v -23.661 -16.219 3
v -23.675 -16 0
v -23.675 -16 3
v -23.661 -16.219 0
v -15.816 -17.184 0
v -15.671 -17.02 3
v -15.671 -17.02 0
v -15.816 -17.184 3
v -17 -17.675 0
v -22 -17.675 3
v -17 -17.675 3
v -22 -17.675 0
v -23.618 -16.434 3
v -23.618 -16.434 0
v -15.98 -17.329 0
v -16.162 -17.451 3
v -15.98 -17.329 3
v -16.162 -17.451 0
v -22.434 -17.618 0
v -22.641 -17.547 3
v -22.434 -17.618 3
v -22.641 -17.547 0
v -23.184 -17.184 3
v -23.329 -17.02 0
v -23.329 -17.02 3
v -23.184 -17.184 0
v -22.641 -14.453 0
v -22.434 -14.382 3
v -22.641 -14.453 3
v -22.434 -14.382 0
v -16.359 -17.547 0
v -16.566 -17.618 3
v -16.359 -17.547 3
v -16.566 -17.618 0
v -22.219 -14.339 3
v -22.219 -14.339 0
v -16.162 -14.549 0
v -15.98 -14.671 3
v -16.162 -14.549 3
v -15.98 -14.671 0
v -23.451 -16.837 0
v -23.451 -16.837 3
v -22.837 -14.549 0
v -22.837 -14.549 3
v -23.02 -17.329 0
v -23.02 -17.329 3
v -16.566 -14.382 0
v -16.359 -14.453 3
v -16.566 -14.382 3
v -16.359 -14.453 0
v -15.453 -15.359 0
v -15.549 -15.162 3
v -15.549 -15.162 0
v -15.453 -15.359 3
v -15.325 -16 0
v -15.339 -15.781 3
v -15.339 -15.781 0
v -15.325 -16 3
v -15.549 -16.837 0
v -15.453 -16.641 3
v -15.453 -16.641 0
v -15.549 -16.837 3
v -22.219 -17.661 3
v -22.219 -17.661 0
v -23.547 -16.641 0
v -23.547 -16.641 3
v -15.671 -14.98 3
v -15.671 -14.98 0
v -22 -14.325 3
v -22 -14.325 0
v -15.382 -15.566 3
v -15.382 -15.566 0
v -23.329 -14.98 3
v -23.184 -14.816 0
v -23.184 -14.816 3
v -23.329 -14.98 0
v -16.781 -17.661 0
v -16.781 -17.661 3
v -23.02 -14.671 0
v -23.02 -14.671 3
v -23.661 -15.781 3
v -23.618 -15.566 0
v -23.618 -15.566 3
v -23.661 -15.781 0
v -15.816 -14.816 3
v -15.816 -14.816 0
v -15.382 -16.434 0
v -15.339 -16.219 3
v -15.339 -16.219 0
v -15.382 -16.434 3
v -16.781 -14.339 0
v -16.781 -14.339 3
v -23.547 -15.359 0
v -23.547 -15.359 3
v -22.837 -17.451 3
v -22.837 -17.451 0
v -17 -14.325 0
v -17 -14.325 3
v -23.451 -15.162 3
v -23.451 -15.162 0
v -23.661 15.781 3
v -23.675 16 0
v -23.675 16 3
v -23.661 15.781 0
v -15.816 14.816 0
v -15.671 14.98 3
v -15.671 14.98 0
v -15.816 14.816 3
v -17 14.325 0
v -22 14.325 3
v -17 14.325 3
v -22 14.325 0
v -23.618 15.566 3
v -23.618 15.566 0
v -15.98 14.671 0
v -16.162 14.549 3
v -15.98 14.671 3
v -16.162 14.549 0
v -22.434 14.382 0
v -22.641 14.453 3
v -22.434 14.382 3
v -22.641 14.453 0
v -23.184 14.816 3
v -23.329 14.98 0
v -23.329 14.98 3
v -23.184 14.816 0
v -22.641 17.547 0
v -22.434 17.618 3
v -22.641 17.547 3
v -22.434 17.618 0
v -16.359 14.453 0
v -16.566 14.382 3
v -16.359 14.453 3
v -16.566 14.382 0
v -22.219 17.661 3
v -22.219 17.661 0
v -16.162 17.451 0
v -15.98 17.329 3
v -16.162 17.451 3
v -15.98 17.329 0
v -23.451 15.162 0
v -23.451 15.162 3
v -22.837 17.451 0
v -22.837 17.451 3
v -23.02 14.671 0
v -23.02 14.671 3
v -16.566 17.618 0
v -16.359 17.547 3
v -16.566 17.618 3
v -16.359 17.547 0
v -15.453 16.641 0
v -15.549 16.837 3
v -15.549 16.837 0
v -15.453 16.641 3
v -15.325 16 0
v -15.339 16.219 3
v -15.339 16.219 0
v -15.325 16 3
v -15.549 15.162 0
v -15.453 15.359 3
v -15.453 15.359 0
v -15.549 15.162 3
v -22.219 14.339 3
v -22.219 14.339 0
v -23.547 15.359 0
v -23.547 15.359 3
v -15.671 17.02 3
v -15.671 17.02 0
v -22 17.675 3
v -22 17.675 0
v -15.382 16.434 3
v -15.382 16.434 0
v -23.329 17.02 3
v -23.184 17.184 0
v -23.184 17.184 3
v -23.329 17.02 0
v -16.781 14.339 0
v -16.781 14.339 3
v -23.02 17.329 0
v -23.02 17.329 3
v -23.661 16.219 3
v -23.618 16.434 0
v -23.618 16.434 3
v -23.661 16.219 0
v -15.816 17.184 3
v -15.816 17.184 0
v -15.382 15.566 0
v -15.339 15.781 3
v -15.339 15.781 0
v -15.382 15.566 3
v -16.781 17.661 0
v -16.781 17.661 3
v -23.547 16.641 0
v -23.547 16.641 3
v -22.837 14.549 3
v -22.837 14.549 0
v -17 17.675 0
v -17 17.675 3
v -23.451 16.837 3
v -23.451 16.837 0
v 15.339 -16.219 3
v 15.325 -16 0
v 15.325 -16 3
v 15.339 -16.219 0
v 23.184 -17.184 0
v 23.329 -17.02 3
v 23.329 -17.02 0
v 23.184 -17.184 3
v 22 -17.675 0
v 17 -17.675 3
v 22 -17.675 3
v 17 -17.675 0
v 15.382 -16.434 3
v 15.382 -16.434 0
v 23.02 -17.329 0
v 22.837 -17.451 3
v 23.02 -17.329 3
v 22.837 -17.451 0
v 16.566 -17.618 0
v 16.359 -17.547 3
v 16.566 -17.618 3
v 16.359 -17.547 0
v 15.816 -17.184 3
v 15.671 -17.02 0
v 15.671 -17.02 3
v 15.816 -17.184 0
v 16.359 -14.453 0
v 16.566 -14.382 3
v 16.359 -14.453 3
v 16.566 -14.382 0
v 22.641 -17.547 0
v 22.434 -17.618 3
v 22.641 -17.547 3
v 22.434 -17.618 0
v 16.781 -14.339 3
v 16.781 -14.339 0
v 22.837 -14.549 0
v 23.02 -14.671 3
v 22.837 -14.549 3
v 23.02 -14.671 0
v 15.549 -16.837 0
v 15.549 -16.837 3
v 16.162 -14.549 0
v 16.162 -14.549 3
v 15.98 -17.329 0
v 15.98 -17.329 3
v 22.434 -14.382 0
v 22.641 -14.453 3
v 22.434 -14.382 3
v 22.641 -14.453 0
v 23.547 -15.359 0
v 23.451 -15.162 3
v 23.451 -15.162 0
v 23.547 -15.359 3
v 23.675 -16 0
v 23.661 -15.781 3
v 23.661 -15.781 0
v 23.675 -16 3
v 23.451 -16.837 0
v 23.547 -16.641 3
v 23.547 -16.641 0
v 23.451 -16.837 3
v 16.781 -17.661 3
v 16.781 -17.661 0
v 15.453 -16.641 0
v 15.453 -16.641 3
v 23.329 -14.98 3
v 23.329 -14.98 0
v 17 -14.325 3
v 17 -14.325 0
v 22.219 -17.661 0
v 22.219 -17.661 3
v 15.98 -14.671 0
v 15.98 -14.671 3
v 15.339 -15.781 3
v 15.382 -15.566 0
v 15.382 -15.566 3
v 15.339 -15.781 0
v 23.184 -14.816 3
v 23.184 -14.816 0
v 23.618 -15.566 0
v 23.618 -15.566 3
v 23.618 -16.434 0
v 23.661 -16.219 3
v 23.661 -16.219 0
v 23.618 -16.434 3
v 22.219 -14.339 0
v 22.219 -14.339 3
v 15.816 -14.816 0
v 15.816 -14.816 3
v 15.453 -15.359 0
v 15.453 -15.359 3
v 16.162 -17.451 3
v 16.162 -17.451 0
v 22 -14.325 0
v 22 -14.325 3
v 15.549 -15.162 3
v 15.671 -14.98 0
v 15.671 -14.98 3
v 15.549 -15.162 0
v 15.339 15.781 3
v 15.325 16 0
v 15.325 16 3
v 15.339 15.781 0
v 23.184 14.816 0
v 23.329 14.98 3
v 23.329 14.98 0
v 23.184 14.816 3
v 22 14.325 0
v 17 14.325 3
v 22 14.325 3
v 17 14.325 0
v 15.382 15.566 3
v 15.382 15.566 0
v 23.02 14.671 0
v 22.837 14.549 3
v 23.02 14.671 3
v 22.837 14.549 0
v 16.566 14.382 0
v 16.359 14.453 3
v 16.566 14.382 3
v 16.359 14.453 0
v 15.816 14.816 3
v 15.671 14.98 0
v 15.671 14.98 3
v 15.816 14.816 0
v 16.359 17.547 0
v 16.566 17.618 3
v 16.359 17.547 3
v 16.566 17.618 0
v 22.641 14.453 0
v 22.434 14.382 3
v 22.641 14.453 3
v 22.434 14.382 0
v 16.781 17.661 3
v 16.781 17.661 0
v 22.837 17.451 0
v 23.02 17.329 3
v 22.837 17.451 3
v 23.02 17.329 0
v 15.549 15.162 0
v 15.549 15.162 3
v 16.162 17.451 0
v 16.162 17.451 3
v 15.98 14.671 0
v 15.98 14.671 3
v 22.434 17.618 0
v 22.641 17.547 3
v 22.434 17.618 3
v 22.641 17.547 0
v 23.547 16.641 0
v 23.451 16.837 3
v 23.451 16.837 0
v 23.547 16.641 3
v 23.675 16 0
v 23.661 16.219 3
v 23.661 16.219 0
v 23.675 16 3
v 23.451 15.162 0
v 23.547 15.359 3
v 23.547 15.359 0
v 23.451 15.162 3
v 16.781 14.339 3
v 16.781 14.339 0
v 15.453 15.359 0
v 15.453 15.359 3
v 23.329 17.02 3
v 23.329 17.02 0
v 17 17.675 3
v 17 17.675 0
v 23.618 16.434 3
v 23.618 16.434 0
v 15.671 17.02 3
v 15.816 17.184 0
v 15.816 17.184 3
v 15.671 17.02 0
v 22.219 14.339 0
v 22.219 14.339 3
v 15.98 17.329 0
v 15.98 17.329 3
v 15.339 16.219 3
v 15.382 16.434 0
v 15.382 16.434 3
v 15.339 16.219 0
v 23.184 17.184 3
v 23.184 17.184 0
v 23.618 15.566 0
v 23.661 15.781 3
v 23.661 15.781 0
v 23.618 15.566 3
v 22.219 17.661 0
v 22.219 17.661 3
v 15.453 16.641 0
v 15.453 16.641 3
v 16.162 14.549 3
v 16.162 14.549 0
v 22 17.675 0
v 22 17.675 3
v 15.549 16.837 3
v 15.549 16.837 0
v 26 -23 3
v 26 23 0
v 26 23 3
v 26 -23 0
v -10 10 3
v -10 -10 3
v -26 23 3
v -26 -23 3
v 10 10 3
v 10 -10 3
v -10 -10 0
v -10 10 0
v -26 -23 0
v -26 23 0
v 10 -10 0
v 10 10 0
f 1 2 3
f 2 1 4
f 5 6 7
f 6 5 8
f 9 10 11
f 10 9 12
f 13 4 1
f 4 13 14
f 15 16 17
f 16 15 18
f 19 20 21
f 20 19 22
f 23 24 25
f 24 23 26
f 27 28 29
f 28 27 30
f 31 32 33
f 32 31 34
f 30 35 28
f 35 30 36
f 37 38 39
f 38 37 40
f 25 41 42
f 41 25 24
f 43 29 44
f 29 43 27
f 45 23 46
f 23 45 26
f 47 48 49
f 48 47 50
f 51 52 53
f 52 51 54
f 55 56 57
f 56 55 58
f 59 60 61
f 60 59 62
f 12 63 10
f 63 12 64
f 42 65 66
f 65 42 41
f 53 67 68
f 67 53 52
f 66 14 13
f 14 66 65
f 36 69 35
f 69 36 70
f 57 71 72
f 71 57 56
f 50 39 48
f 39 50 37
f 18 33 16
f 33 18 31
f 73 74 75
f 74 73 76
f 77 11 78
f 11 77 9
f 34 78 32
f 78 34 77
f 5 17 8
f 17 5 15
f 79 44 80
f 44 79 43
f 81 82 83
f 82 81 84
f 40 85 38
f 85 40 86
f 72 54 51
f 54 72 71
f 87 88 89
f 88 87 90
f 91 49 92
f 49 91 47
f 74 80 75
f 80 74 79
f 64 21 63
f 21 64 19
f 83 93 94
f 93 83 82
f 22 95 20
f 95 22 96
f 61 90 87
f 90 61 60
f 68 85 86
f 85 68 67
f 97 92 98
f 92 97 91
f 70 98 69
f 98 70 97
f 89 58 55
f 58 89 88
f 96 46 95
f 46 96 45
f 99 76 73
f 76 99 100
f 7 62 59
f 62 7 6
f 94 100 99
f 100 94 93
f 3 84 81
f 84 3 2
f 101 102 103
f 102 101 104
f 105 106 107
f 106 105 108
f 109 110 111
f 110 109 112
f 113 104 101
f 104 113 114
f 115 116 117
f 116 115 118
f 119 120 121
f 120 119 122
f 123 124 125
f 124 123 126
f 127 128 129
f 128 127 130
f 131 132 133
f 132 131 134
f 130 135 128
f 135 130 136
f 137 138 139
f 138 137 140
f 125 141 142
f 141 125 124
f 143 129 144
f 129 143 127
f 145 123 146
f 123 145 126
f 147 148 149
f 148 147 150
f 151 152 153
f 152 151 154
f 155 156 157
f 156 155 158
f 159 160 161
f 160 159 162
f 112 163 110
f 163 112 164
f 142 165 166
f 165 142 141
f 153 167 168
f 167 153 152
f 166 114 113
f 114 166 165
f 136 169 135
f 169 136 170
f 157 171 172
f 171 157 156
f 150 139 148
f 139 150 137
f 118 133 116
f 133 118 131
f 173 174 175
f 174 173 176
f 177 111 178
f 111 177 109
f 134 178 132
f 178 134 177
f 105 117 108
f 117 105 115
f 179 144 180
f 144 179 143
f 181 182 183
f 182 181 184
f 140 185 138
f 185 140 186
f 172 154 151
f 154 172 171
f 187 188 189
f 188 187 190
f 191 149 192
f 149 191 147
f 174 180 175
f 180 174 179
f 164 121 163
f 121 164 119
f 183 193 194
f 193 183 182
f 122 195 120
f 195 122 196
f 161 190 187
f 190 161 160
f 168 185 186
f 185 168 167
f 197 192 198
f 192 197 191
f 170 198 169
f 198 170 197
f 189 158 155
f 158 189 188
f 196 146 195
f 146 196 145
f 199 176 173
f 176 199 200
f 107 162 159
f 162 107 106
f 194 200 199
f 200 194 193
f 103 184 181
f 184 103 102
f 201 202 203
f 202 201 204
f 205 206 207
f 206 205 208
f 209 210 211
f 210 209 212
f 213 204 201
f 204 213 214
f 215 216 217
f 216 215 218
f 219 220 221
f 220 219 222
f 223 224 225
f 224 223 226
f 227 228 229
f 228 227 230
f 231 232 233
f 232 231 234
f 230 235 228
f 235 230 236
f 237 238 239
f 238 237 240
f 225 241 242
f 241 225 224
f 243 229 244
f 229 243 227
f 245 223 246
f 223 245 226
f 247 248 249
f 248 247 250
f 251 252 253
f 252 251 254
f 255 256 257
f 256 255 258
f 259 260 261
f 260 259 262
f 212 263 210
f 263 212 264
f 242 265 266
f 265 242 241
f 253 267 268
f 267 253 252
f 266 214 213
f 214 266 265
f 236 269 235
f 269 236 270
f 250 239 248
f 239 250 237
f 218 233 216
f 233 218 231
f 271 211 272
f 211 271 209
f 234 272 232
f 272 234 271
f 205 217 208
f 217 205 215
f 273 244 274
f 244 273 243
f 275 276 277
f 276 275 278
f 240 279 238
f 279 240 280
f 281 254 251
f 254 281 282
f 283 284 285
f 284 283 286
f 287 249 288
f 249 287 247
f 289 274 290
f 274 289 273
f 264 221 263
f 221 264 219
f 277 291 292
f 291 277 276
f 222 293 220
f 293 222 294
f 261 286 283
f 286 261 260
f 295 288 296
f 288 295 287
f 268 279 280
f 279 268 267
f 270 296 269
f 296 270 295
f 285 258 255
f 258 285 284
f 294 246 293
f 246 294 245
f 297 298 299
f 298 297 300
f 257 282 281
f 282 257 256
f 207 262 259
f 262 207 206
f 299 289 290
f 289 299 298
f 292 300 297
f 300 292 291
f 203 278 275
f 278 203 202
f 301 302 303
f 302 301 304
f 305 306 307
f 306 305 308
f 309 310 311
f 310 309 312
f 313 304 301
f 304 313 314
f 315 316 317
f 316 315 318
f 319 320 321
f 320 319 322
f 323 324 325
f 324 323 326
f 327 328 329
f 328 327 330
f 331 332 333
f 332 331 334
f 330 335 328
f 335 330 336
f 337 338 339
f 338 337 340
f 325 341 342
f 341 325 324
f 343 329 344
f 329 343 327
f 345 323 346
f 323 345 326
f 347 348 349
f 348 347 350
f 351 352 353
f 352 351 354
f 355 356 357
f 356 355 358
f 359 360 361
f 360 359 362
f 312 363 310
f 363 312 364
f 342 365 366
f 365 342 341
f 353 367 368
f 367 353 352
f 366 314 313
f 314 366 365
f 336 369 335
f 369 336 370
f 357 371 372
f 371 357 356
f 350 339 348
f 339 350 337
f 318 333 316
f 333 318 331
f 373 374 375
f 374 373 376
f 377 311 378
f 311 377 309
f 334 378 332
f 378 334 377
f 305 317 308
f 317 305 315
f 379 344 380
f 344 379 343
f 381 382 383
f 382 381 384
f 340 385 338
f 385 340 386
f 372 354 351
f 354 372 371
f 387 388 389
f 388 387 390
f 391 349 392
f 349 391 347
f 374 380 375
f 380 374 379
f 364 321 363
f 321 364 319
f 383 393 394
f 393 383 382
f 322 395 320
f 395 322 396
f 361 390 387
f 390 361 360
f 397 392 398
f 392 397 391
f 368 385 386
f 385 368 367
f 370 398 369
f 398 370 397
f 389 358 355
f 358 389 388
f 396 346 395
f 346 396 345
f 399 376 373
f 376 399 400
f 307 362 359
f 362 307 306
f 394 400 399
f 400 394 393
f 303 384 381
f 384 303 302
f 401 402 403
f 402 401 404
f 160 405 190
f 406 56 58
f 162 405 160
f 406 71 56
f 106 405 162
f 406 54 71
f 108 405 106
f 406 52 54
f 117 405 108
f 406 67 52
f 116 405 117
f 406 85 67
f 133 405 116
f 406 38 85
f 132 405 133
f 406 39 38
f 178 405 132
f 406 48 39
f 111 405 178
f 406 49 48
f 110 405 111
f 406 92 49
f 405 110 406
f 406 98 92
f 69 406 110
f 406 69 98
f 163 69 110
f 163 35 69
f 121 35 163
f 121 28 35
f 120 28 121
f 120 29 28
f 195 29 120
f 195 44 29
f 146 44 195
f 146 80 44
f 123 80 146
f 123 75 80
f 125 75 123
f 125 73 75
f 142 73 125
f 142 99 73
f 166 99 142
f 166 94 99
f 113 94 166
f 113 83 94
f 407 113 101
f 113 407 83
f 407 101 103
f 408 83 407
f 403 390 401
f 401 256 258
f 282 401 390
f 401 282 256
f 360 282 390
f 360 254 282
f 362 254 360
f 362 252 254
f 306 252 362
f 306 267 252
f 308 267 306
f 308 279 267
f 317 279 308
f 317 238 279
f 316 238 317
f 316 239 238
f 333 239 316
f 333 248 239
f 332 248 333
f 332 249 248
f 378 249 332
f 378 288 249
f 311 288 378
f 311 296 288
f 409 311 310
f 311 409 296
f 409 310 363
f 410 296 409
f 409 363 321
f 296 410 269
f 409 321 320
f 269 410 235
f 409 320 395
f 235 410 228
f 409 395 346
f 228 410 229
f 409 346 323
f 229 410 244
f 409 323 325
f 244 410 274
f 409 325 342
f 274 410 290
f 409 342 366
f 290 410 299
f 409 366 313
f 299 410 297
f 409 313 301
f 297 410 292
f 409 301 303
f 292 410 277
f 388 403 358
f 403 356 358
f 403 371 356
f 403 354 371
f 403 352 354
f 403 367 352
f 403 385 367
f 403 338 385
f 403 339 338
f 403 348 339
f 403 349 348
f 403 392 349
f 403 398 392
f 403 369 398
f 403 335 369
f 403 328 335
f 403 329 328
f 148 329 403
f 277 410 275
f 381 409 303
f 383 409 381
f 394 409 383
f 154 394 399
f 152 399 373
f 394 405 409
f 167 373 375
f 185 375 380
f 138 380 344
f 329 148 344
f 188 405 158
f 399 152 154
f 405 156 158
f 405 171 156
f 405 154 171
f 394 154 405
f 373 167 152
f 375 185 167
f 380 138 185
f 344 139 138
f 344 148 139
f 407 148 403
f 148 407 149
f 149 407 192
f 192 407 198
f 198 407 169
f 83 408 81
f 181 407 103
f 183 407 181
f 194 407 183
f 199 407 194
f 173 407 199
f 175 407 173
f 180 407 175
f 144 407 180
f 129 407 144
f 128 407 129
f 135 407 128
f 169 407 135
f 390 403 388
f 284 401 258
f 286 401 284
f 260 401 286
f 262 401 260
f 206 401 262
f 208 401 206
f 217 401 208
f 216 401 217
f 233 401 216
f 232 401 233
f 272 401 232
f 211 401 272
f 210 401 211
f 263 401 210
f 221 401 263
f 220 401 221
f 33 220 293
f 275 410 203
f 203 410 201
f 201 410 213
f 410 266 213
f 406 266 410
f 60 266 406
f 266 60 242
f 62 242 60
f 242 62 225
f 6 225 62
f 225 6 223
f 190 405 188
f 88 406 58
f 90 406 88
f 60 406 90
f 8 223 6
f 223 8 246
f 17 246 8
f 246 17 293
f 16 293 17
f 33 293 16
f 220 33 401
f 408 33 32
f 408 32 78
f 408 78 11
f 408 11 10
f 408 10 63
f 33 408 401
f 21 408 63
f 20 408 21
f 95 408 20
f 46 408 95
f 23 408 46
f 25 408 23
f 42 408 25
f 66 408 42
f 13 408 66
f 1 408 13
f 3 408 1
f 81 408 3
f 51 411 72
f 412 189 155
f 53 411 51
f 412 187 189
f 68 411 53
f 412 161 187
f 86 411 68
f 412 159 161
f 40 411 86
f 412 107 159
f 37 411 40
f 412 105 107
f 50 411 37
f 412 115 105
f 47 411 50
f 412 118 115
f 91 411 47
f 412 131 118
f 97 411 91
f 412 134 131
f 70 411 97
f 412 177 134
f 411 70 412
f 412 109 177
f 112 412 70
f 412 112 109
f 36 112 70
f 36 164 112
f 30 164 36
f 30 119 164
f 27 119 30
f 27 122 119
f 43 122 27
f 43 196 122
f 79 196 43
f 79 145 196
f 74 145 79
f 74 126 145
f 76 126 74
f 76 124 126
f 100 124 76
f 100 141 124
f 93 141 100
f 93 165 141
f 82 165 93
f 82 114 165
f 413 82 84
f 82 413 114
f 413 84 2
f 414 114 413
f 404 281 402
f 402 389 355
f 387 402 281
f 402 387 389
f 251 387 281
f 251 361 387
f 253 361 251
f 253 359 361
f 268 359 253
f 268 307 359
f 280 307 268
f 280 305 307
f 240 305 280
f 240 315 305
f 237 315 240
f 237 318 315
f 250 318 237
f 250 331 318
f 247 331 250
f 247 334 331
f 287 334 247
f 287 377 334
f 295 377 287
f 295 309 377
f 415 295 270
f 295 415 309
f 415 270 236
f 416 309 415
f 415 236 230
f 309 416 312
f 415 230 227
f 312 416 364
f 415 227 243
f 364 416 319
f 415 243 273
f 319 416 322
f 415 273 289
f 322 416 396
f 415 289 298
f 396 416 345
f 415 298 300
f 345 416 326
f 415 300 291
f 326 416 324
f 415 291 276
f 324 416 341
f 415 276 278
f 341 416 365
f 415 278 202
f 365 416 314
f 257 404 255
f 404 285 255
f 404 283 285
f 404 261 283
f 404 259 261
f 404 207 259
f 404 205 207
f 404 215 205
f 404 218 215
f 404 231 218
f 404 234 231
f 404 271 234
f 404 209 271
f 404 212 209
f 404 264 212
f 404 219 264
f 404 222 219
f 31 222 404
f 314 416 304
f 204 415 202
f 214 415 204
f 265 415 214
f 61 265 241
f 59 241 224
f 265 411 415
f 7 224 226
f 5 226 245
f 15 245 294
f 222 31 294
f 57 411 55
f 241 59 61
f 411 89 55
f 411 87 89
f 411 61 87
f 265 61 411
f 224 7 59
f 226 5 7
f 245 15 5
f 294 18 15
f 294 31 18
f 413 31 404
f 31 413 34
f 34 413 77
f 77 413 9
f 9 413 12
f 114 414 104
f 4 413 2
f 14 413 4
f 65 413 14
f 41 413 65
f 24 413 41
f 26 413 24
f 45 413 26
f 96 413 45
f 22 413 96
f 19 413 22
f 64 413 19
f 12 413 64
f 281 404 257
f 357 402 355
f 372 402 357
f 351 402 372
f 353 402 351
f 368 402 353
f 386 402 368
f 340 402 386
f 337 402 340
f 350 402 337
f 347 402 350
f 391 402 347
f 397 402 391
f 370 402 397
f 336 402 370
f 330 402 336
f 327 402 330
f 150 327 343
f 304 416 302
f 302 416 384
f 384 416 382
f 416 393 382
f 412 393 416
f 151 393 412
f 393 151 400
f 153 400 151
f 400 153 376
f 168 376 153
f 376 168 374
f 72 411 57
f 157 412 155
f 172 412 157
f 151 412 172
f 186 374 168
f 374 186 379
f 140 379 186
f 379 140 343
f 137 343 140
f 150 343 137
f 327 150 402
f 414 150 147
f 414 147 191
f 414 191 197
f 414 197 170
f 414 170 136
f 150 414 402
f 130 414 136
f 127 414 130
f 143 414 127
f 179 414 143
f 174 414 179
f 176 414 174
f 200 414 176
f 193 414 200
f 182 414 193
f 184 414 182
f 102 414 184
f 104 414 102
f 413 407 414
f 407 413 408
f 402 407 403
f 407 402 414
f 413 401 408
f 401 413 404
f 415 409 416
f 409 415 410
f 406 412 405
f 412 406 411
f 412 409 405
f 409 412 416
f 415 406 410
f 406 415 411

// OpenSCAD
// ONE desk robot adapter kit. CC0 original code. Units mm.
// These are prototype adapter parts, not the finished merged robot assembly.
// Preserve the upstream licenses of original chassis, gripper, lift and head.
// Use openscad -o part.stl -D 'part="oled_bezel"' one_robot_adapter_kit.scad
$fn=48;
part="head_bridge";
fit_xy=.35;
m2_clearance_d=2.35;
m3_clearance_d=3.35;
head_bridge_x=52;
head_bridge_y=46;
head_mount_x=39;
head_mount_y=32;
head_wire_clearance=20;
tof_pcb_w=14;
tof_pcb_h=18;
tof_lens_d=6;
oled_pcb_x=27;
oled_pcb_y=27;
oled_window_x=22;
oled_window_y=12;
// Exact active candidate envelope only; solder pads, leads and gasket
// still require a physical coupon before any sealed speaker chamber.
speaker_l=20;
speaker_w=16;
speaker_h=4.7;
fsr_d=12;
dock_tag_black_square=60;
dock_mount_spacing=76;
// Dimensions above are placeholders until real hardware is measured.
module oval_slot(l=7,d=2.5,h=5){
  hull(){
    translate([-l/2,0,0]) cylinder(h=h,d=d,center=true);
    translate([ l/2,0,0]) cylinder(h=h,d=d,center=true);
  }
}
module head_bridge(){
  difference(){
    translate([0,0,1.5]) cube([head_bridge_x,head_bridge_y,3],center=true);
    translate([0,0,2]) cube([head_wire_clearance,head_wire_clearance,6],center=true);
    for(x=[-head_mount_x/2,head_mount_x/2],y=[-head_mount_y/2,head_mount_y/2])
      translate([x,y,2]) oval_slot(5,m3_clearance_d,7);
  }
}
module tof_adjustable(){
  base_x=tof_pcb_w+12; face_z=tof_pcb_h+7;
  difference(){
    union(){
      translate([0,0,1.5]) cube([base_x,19,3],center=true);
      translate([0,7.5,face_z/2]) cube([base_x,3,face_z],center=true);
      for(x=[-base_x/2+4,base_x/2-4])
        hull(){
          translate([x,3,3]) cube([3,9,3],center=true);
          translate([x,7.5,9]) cube([3,3,3],center=true);
        }
    }
    for(x=[-base_x/4,base_x/4])
      translate([x,-4,1.5]) rotate([0,0,90]) oval_slot(5,m2_clearance_d,7);
    translate([0,7.5,face_z/2+1]) rotate([90,0,0])
      cylinder(h=7,d=tof_lens_d+2,center=true);
    for(x=[-tof_pcb_w/2+2,tof_pcb_w/2-2])
      translate([x,7.5,face_z/2+1]) rotate([90,0,0])
        oval_slot(6,m2_clearance_d,7);
  }
}
module oled_bezel(){
  x=oled_pcb_x+8; y=oled_pcb_y+8;
  difference(){
    translate([0,0,1.5]) cube([x,y,3],center=true);
    translate([0,0,1.5])
      cube([oled_window_x+fit_xy,oled_window_y+fit_xy,5],center=true);
    for(xx=[-x/2+3,x/2-3],yy=[-y/2+3,y/2-3])
      translate([xx,yy,1.5]) cylinder(h=5,d=m2_clearance_d,center=true);
  }
}
module speaker_grille(){
  // Current fixed rectangular Challenge CS20-02P110-04-1X 8ohm 2W.
  // This is a PERFORATED FRONT PLATE only, not the 1cc sealed chamber.
  // Keep it dimensionally separate from the physical speaker pocket and
  // its solder-pad strain relief; do not reuse retired 20mm round grille.
  assert(speaker_l == 20 && speaker_w == 16 && speaker_h == 4.7);
  panel_x=speaker_l+12; panel_y=speaker_w+12;
  difference(){
    translate([0,0,1.5]) cube([panel_x,panel_y,3],center=true);
    for(x=[-7.5,-3.75,0,3.75,7.5],y=[-5,0,5])
      if(abs(x)+1.2 < speaker_l/2 && abs(y)+1.2 < speaker_w/2)
        translate([x,y,1.5]) cylinder(h=6,d=2.4,center=true);
    for(x=[-panel_x/2+3.5,panel_x/2-3.5],
        y=[-panel_y/2+3.5,panel_y/2-3.5])
      translate([x,y,1.5]) cylinder(h=5,d=m2_clearance_d,center=true);
  }
}
module fsr_jaw_pocket(){
  x=fsr_d+10; y=fsr_d+10;
  difference(){
    union(){
      translate([0,0,1.25]) cube([x,y,2.5],center=true);
      translate([0,0,2.4]) difference(){
        cylinder(h=1.5,d=fsr_d+3);
        cylinder(h=2,d=fsr_d+fit_xy);
      }
    }
    translate([0,0,3.3]) cylinder(h=3,d=fsr_d+fit_xy,center=true);
    translate([0,-y/2+2,2.5]) cube([3.5,9,5],center=true);
    for(xx=[-x/2+2.5,x/2-2.5])
      translate([xx,0,1.25]) cylinder(h=5,d=2,center=true);
  }
}
module dock_tag_backplate(){
  side=dock_tag_black_square+20;
  difference(){
    union(){
      translate([0,0,1.5]) cube([side,side,3],center=true);
      translate([0,-side/2+4,6]) cube([side,8,12],center=true);
    }
    for(x=[-dock_mount_spacing/2,dock_mount_spacing/2],
        y=[-dock_mount_spacing/2,dock_mount_spacing/2])
      translate([x,y,1.5]) cylinder(h=5,d=m3_clearance_d,center=true);
    for(x=[-dock_mount_spacing/4,dock_mount_spacing/4])
      translate([x,-side/2+4,7]) rotate([90,0,0])
        oval_slot(6,m3_clearance_d,12);
  }
}
module wire_clip(){
  difference(){
    cube([16,13,4]);
    for(x=[3,13]) translate([x,6.5,2]) cylinder(h=6,d=2.3,center=true);
    translate([8,6.5,2.5]) cube([6,4,6],center=true);
  }
}
if(part=="head_bridge") head_bridge();
else if(part=="tof_adjustable") tof_adjustable();
else if(part=="oled_bezel") oled_bezel();
else if(part=="speaker_grille") speaker_grille();
else if(part=="fsr_jaw_pocket") fsr_jaw_pocket();
else if(part=="dock_tag_backplate") dock_tag_backplate();
else if(part=="wire_clip") wire_clip();
else assert(false,"Unknown adapter part");
